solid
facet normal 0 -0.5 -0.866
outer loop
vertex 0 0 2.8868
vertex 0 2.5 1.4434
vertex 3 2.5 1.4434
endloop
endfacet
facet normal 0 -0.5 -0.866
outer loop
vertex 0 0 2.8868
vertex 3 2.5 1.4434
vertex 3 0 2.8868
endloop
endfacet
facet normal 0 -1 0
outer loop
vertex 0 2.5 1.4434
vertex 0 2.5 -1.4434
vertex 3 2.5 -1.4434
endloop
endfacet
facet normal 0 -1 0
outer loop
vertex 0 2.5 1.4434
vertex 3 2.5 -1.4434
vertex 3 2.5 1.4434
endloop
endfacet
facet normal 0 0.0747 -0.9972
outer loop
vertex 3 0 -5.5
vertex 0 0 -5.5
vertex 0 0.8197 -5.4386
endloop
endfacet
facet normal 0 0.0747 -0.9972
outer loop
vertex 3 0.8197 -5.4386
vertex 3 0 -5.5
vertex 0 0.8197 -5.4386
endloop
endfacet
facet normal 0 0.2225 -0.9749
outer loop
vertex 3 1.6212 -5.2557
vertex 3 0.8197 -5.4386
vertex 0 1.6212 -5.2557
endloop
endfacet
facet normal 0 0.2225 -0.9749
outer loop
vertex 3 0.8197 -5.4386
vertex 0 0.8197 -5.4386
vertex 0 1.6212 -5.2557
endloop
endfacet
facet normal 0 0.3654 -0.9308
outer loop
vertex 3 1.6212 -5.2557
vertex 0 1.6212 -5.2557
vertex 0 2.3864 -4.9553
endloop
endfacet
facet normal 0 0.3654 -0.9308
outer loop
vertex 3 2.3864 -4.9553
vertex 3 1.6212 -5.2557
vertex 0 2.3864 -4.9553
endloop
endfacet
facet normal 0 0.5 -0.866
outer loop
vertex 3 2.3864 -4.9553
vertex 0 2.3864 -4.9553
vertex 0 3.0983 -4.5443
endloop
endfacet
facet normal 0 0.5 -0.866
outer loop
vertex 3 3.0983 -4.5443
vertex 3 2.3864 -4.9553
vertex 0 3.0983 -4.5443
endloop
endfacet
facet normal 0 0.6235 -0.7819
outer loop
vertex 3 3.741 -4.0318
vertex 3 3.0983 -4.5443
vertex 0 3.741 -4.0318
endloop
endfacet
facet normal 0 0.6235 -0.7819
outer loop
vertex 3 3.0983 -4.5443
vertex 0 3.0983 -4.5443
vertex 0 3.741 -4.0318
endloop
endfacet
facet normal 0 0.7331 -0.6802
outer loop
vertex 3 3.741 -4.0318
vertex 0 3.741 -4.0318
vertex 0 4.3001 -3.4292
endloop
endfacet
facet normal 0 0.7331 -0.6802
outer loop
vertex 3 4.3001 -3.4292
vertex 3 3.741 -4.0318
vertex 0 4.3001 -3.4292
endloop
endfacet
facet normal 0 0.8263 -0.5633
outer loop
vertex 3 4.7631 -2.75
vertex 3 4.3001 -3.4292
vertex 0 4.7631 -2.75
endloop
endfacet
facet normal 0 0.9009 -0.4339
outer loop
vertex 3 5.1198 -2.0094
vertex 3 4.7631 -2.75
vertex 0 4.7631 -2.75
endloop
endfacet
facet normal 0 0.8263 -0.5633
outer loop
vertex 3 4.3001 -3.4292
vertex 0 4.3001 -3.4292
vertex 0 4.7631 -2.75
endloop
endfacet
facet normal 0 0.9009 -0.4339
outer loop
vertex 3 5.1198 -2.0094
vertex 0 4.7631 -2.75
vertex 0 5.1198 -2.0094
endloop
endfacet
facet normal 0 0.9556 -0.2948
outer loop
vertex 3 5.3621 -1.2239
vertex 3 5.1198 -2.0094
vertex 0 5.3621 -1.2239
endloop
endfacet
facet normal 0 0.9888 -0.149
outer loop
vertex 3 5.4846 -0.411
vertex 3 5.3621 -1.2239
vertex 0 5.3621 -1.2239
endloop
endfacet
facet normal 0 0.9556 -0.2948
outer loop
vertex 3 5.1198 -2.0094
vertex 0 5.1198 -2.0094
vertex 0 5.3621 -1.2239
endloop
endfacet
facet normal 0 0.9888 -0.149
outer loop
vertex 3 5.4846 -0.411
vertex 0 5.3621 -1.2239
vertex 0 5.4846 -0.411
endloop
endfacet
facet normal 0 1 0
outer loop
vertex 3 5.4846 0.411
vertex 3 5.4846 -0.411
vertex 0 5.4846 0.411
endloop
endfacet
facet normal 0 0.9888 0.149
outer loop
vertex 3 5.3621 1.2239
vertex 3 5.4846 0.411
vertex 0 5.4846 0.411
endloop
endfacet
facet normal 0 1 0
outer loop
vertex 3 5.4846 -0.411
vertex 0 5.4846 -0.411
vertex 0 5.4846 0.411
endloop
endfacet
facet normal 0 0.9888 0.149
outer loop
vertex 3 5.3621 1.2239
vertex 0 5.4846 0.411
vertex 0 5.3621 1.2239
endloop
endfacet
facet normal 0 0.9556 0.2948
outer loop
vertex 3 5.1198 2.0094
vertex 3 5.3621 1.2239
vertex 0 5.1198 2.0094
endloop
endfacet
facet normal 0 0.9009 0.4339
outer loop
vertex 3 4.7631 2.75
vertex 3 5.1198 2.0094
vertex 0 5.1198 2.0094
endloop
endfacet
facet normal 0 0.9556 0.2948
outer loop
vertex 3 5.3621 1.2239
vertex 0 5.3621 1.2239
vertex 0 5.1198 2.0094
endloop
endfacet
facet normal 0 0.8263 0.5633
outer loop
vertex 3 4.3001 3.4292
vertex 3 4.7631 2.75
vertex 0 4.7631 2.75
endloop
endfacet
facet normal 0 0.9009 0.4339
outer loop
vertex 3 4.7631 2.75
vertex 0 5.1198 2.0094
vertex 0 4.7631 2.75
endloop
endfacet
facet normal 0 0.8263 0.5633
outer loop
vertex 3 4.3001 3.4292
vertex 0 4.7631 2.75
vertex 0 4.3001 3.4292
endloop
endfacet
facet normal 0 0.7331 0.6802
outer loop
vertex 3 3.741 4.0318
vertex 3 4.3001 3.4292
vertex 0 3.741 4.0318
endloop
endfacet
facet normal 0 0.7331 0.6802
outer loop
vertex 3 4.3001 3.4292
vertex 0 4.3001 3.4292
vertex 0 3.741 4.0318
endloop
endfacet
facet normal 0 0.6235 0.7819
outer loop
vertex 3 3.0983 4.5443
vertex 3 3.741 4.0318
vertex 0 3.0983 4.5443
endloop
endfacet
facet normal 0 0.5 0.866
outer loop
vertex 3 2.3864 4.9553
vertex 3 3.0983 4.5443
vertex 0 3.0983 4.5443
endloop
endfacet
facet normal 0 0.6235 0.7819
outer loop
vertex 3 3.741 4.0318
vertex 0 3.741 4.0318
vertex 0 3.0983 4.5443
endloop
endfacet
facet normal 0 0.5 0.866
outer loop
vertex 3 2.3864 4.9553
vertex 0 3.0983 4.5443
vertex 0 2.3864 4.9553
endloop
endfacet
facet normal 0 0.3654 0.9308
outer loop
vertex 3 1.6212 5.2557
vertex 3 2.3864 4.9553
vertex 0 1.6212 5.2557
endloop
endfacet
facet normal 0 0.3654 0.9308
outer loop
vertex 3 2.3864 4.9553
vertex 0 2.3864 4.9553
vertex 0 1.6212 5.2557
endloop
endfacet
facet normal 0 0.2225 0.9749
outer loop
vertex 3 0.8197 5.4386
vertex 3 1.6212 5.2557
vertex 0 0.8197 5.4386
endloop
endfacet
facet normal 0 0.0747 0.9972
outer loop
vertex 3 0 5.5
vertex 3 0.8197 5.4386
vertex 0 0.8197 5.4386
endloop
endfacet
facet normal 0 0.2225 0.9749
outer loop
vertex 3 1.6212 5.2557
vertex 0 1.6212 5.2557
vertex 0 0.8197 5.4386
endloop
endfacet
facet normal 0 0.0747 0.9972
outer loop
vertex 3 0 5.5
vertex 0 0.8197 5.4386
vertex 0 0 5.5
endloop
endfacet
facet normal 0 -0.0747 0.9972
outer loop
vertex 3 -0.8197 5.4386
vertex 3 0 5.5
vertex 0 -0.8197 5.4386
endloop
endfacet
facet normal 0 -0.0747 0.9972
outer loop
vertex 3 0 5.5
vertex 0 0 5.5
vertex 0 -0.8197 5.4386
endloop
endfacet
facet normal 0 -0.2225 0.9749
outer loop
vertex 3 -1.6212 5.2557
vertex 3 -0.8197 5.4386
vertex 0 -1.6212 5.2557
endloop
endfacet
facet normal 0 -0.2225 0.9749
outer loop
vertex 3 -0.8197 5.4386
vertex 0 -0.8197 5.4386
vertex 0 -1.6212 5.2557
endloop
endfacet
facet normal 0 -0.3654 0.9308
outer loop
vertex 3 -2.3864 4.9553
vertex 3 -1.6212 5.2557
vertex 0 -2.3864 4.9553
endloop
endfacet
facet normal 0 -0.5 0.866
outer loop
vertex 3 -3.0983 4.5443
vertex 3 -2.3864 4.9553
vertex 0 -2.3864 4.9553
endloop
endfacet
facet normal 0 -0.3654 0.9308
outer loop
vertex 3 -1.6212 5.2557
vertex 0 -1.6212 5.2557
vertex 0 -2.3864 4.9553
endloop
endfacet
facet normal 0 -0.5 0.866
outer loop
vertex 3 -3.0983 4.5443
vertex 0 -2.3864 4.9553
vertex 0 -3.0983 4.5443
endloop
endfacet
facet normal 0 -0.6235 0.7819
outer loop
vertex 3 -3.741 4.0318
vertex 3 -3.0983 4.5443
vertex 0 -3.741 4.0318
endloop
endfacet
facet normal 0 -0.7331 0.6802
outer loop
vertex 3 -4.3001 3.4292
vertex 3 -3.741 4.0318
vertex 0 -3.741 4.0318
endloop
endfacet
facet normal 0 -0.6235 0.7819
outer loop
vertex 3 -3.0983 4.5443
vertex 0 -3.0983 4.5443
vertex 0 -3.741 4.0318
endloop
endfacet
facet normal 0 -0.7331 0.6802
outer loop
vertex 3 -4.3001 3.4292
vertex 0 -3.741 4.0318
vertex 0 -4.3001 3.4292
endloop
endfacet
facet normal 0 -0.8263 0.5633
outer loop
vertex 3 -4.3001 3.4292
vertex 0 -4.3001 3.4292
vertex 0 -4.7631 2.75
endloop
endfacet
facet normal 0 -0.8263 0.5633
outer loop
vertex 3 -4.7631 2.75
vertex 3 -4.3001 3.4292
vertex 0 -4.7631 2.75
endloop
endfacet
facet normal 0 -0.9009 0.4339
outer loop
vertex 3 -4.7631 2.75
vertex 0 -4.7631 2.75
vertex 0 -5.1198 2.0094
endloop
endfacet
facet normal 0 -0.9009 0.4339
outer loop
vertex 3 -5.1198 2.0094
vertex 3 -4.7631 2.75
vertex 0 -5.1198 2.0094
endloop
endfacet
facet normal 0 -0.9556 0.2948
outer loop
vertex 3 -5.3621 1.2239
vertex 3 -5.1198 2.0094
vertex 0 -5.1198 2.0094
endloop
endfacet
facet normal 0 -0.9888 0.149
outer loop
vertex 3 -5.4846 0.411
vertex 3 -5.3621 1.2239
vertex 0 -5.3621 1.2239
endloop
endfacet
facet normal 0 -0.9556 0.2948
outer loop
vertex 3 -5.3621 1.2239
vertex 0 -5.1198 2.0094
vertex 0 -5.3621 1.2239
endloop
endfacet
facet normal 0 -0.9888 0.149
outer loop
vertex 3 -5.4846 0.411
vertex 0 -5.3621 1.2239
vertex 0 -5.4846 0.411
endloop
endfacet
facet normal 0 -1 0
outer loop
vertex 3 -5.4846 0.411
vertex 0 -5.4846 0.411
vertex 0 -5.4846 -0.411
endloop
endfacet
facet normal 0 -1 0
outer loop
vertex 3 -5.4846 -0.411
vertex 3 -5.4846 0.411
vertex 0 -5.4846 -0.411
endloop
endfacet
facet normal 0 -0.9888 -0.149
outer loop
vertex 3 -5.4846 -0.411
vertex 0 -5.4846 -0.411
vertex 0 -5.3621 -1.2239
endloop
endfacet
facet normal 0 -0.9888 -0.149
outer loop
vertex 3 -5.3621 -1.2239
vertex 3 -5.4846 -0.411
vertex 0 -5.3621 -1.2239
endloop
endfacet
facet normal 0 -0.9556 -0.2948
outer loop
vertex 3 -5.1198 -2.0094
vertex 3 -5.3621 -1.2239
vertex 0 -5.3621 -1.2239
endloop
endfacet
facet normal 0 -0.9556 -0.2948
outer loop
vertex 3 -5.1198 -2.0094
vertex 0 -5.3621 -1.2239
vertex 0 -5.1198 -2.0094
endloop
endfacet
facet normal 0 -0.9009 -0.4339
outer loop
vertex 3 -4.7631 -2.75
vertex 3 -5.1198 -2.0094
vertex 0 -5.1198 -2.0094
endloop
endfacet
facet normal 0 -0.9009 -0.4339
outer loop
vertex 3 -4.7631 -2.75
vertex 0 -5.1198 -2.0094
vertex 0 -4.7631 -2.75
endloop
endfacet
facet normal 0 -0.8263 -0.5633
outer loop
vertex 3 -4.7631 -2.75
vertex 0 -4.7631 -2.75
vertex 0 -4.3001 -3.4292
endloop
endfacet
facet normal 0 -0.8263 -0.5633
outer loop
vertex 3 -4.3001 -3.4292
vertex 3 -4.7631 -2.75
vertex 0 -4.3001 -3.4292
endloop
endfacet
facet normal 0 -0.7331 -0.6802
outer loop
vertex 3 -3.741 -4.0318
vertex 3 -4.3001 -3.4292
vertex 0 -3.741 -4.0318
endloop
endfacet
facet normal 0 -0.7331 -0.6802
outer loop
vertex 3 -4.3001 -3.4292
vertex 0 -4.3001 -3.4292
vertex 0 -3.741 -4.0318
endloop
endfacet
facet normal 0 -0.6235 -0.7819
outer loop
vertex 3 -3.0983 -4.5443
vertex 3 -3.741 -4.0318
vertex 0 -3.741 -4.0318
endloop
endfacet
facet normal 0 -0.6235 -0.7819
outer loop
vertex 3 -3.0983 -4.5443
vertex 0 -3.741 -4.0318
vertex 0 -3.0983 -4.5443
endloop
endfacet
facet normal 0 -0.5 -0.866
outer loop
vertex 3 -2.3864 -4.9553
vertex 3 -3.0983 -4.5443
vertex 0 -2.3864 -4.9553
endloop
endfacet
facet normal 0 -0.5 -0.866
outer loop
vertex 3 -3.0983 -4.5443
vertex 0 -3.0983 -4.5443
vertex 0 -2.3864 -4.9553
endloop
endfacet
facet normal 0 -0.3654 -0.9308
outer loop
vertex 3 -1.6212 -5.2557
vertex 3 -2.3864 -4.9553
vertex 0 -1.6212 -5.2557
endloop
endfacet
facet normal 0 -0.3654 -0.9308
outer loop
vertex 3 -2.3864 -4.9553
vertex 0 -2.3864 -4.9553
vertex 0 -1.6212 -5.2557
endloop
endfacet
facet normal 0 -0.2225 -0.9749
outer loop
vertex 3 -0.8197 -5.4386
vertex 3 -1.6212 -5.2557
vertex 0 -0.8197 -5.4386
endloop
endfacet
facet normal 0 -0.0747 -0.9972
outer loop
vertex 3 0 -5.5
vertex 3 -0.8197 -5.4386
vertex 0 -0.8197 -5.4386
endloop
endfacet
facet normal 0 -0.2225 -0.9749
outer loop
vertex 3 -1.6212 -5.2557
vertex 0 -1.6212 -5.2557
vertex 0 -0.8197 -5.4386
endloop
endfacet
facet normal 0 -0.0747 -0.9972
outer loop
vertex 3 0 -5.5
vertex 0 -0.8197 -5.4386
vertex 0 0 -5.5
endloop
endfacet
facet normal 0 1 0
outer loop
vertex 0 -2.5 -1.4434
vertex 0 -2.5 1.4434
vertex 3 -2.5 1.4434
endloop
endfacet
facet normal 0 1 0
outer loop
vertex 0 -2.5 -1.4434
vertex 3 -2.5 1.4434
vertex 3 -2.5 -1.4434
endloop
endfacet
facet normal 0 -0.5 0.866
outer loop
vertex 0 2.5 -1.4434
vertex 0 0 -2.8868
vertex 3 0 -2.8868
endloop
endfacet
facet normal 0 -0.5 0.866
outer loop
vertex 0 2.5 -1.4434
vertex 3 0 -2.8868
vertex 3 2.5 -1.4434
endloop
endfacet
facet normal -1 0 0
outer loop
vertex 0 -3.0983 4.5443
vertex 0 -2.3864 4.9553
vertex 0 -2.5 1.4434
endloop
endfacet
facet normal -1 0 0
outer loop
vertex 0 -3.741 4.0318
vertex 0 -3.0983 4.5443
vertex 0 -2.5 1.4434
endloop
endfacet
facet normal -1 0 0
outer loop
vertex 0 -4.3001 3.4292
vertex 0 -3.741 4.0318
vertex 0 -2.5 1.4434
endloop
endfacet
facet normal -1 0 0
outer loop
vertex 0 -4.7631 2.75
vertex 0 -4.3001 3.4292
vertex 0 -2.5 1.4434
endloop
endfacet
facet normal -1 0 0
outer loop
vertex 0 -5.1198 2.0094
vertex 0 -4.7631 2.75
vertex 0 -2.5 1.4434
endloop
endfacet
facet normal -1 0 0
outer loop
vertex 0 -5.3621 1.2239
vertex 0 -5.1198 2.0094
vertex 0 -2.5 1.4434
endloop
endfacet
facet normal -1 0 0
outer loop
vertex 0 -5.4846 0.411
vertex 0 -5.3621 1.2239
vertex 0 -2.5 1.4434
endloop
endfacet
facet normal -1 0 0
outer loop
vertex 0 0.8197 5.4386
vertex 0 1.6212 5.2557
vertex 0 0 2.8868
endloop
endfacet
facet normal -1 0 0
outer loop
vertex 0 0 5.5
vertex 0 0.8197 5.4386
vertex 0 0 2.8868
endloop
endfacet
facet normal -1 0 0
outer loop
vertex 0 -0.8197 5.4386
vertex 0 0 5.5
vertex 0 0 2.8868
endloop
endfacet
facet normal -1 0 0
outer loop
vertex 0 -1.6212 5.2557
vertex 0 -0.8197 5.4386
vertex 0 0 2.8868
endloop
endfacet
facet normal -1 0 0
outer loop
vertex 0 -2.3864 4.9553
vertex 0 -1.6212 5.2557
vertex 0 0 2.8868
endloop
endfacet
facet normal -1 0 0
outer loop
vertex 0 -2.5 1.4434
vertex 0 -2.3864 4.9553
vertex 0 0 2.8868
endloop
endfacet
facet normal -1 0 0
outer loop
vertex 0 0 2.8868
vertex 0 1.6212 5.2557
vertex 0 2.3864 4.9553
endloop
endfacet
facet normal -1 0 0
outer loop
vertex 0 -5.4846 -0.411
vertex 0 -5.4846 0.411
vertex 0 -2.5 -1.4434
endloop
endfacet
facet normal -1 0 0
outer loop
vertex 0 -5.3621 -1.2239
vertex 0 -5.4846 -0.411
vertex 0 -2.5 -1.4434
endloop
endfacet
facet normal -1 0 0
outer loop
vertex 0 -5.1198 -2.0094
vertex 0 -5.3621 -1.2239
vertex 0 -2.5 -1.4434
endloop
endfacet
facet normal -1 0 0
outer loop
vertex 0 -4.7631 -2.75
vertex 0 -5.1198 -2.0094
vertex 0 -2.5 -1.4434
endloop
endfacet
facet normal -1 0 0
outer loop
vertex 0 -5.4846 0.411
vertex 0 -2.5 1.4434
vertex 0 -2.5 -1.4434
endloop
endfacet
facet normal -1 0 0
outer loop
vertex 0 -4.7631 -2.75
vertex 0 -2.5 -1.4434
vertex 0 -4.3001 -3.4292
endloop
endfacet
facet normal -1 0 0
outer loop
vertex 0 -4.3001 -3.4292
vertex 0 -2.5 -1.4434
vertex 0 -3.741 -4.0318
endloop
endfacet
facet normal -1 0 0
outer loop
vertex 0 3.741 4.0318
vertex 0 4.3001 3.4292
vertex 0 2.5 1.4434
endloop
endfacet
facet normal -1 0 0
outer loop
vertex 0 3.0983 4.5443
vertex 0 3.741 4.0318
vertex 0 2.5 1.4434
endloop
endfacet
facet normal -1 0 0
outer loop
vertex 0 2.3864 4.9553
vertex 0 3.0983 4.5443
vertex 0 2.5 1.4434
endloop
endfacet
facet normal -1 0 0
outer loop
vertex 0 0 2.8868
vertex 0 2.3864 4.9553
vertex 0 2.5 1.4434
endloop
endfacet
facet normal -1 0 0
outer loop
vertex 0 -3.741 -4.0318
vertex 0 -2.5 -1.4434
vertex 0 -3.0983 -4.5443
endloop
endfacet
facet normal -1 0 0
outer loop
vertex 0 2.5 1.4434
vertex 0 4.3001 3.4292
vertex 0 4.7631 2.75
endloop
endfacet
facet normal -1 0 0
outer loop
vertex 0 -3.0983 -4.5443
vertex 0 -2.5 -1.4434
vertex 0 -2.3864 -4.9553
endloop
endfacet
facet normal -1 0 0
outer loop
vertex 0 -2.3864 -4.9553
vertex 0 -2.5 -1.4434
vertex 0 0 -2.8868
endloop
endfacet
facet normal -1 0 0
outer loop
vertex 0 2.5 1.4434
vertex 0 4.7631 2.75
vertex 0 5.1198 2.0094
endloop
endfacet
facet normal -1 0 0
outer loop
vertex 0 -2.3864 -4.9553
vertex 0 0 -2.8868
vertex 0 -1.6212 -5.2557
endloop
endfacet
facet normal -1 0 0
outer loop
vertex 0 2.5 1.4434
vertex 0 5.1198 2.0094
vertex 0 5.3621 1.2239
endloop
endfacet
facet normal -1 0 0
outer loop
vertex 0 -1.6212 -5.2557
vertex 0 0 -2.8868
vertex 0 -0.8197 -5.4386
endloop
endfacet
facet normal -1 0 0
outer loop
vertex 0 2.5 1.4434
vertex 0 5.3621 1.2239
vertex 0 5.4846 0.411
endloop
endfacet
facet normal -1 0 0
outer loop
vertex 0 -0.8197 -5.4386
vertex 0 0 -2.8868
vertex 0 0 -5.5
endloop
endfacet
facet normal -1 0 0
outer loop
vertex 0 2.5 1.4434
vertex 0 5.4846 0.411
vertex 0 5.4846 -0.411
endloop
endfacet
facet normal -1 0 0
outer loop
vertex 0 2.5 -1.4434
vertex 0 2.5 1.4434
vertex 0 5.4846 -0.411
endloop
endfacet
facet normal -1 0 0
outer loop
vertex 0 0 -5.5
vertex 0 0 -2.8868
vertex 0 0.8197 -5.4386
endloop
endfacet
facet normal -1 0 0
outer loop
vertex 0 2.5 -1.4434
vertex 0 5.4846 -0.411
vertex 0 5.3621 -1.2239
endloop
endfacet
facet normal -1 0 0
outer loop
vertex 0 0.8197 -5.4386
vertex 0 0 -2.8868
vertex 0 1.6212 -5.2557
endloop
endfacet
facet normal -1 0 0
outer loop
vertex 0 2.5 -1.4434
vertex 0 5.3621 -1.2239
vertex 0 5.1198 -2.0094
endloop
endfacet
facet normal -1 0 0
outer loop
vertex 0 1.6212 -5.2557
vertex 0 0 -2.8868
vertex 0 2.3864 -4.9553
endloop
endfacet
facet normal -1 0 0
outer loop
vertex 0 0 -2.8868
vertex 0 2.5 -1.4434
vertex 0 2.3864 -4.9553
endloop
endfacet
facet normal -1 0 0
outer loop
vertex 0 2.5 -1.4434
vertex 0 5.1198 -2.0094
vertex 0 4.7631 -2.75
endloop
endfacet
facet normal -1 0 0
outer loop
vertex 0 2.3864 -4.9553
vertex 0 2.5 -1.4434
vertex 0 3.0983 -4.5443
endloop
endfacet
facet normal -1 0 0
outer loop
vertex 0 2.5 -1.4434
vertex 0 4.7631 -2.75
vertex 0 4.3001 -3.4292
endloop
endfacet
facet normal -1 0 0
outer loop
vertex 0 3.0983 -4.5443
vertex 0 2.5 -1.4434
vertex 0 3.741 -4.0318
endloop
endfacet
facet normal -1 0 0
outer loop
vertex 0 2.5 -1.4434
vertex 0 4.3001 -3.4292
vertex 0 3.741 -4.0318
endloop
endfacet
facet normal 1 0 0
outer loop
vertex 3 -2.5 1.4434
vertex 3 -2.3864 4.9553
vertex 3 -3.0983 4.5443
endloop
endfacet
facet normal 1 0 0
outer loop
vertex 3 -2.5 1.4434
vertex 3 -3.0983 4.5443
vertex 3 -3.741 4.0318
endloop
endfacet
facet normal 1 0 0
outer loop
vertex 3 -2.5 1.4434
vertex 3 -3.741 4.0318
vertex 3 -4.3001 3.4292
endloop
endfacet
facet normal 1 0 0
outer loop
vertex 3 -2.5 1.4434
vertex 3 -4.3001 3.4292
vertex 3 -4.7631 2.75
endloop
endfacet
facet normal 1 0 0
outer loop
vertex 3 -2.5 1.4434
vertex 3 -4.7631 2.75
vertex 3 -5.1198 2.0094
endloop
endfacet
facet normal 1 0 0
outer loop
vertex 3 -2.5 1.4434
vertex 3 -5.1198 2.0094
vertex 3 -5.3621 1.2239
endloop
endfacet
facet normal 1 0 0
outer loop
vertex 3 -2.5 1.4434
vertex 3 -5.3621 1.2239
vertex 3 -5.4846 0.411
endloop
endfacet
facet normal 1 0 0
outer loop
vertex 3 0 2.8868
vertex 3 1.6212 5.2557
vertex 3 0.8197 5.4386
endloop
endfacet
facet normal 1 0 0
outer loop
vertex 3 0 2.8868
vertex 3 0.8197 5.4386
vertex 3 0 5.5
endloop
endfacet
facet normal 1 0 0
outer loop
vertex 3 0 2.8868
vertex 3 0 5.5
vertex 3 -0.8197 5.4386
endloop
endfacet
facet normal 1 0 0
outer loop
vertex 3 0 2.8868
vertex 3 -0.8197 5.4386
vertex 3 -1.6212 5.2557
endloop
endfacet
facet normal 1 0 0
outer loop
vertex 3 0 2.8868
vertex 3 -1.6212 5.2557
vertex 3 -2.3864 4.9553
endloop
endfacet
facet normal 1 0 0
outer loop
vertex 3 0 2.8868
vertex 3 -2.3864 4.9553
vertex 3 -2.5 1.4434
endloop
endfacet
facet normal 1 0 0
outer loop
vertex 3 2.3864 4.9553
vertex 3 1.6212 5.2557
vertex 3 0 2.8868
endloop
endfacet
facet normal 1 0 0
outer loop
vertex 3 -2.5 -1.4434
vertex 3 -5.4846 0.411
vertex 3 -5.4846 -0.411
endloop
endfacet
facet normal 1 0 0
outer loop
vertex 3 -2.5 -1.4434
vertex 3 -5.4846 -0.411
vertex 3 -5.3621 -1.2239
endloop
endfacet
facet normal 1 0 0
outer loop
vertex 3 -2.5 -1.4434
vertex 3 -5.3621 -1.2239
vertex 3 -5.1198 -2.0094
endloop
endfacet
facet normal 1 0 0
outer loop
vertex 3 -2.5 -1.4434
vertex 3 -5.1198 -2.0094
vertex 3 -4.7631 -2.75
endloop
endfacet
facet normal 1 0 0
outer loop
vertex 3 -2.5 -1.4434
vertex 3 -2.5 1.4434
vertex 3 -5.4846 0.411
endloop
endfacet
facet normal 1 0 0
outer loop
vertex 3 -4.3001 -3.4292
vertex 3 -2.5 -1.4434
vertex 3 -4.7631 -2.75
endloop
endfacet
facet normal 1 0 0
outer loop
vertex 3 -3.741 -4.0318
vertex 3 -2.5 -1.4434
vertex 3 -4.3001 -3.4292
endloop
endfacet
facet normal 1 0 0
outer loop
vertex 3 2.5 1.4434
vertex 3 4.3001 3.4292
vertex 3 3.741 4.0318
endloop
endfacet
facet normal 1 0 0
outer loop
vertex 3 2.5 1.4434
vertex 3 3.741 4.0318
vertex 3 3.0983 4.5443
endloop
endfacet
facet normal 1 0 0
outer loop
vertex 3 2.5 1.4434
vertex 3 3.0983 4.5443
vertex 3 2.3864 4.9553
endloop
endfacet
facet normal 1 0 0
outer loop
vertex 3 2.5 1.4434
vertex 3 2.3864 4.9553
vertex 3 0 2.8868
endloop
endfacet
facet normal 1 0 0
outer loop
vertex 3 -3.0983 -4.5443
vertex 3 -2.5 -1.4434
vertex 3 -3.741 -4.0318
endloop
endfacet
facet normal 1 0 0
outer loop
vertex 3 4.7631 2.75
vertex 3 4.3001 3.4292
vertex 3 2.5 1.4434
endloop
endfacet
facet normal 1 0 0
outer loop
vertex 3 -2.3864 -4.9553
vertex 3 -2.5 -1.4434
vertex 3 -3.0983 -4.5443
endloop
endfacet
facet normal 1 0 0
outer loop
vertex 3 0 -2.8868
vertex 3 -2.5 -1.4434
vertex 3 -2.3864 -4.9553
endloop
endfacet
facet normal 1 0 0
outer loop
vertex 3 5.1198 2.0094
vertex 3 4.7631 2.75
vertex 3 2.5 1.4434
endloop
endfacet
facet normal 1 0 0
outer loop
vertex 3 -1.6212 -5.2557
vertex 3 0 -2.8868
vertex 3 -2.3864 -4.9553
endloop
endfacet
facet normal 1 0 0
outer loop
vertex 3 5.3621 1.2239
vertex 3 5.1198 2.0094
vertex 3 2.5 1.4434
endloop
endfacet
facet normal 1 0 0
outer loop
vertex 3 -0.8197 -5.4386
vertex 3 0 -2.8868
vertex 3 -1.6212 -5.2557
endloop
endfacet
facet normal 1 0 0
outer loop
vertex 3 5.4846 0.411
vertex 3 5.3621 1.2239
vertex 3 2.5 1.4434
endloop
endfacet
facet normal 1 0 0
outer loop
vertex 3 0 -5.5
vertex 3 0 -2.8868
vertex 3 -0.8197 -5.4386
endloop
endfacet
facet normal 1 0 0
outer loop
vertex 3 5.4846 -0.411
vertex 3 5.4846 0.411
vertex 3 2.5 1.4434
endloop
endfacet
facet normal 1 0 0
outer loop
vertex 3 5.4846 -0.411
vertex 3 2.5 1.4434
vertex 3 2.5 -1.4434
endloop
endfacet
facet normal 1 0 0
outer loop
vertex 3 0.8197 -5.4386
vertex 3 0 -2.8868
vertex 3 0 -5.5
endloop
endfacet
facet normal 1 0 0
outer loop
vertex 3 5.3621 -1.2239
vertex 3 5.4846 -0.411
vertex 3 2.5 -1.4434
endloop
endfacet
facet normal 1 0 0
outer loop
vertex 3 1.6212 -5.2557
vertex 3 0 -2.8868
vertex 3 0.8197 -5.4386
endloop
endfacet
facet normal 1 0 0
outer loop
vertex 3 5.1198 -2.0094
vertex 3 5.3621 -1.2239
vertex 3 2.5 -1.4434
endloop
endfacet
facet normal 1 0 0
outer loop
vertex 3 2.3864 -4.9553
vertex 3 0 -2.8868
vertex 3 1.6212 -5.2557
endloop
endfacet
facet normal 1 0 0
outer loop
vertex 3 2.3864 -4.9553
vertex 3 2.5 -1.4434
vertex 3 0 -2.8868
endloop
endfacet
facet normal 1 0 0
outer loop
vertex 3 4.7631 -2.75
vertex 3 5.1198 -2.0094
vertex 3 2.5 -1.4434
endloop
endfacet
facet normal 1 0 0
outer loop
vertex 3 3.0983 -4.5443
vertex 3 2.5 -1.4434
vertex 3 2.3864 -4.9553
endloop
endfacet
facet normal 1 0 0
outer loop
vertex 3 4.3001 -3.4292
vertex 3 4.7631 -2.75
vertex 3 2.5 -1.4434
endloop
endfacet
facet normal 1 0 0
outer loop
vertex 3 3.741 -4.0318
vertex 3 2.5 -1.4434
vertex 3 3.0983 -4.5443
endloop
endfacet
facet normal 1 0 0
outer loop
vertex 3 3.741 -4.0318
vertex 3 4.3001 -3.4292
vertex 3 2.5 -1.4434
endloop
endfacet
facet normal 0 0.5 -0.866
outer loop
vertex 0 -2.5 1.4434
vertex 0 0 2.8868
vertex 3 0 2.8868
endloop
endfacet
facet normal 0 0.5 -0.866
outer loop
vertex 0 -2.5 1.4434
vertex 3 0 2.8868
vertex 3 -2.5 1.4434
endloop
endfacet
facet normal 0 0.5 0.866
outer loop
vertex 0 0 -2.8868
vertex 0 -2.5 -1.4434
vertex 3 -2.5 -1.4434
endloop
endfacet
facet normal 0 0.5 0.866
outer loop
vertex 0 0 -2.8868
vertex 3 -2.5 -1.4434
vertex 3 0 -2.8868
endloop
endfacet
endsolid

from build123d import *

# Parameters (mm, degrees)
SKETCH_1_R      = 5.5
EXTRUDE_1_DEPTH = 3


with BuildPart() as part:
    # 草图1 → 凸台-拉伸1 (new body)
    with BuildSketch(Plane(origin=(0, 0, 0), x_dir=(0, 0, -1), z_dir=(1, 0, 0))):
        Circle(SKETCH_1_R)
        Polygon((2.886751346, 0), (1.443375673, 2.5), (-1.443375673, 2.5), (-2.886751346, 0), (-1.443375673, -2.5), (1.443375673, -2.5), align=None, mode=Mode.SUBTRACT)
    extrude(amount=EXTRUDE_1_DEPTH)


solid = part.part
